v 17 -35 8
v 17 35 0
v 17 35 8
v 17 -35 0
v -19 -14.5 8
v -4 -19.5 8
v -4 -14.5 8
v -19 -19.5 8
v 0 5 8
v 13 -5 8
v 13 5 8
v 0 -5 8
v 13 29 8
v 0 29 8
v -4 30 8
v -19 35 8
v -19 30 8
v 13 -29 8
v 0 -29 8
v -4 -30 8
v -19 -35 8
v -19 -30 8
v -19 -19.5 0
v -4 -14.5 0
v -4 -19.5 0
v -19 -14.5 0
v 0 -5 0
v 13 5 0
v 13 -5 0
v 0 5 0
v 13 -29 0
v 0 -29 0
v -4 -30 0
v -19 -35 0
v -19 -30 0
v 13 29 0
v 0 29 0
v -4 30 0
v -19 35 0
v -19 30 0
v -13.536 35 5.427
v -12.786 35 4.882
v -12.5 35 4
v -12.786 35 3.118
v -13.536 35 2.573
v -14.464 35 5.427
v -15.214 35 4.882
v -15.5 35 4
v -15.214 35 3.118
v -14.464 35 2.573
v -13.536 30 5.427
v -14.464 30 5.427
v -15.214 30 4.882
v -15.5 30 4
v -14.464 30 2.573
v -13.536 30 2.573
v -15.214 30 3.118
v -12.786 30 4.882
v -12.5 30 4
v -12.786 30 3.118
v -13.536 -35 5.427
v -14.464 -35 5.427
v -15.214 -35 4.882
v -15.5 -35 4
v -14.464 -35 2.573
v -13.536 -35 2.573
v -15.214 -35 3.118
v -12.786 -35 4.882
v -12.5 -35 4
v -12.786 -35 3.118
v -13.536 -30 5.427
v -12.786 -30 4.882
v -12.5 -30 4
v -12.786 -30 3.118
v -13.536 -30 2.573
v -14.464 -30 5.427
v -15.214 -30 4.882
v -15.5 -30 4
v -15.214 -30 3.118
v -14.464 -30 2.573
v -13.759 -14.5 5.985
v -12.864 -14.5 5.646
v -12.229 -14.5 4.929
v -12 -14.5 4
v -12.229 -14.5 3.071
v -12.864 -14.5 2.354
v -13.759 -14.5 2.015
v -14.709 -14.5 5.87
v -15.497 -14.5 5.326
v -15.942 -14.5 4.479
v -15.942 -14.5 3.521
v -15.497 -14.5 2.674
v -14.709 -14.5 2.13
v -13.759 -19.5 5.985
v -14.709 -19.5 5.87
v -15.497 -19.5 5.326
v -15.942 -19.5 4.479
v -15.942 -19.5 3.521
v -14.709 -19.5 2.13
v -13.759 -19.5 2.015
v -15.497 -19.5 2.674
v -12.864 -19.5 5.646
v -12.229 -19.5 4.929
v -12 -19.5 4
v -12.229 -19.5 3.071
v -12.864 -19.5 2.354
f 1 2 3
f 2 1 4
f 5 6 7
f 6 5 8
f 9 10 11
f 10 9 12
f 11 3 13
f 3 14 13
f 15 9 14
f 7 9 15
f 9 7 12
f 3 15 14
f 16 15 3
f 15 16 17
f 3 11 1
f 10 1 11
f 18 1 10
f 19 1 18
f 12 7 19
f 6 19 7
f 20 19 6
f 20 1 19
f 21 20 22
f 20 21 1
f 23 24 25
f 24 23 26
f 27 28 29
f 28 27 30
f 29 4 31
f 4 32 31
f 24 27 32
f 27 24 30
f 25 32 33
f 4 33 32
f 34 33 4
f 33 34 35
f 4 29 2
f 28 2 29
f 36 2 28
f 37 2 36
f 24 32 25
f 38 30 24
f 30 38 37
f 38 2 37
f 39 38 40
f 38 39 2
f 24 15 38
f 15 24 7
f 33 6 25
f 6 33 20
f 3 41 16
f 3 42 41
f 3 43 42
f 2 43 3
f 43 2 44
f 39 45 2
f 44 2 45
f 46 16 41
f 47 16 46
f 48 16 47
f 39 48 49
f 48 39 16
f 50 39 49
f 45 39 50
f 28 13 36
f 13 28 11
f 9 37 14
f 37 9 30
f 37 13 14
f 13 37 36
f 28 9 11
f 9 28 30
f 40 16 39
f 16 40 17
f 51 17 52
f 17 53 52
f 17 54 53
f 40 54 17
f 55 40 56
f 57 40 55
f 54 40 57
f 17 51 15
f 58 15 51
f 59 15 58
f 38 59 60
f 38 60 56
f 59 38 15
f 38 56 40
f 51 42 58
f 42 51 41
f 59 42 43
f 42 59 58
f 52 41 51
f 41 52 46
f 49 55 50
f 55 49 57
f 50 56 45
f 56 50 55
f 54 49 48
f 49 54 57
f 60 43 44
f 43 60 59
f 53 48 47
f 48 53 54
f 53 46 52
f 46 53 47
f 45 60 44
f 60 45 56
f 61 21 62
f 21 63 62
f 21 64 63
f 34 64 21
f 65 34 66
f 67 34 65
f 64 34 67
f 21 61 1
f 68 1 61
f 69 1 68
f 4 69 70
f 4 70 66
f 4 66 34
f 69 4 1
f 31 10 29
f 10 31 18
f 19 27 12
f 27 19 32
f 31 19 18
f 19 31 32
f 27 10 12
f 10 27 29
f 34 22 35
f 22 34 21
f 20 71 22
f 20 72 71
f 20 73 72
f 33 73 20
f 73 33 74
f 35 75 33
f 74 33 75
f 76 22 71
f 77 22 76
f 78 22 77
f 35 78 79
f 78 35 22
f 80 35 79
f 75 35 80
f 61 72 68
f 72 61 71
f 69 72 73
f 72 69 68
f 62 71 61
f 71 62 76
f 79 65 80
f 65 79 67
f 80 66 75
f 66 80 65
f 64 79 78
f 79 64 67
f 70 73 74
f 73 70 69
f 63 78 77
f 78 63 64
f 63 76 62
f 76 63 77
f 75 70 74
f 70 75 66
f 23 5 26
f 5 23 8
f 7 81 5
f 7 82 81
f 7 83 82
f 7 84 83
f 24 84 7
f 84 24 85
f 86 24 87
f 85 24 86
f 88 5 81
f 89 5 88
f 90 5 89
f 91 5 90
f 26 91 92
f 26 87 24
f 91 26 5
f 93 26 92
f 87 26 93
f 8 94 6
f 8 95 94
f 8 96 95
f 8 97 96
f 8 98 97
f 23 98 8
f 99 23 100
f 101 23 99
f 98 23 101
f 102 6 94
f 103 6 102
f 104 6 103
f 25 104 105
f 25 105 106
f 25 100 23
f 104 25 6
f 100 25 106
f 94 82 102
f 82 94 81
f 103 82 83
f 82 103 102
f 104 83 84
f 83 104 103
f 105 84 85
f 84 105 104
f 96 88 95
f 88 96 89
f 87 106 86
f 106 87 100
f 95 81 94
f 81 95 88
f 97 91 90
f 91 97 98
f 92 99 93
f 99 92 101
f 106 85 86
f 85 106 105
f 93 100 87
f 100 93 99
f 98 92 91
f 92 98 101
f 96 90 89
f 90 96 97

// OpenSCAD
$fs=1;
$fa=1;

servo_l = 24;
servo_w = 13;
servo_h = 21;

bolt_hole_diameter = 3.0;
servo_axis_diameter = 4;

magnet_hole_l = 10.5;
magnet_hole_w = 6.5;
magnet_hole_d = 2;
magnet_hole_margin = 2;

base_l = servo_l * 2 + 24;
base_w = 44;
base_h = 3;

base_joint_space = 0.7;
base_joint_height = 26;

arm_h = 5;
arm_w = 5;
arm_l = 50;

pen_diameter = 13;

eraser_magnet_diameter = 25.5;

module servoholder(h = 8) {
	module bolt_bracket(d) {
		r=d/2;
		translate([-14,0,h/2])
		difference() {
			translate([4,0]) cube([18,5,h], center=true);
			rotate(a=90,v=[1,0,0]) cylinder(r=r, h=20, center=true);
		}
	}
	translate([0,0,-h/2]) {
		for (i = [0,1]) mirror([0,i,0]) {
			translate([0,5,0])
			difference() {
				translate([-4, -6]) cube([servo_w + 8, servo_l + 12, h]);
				translate([0,0,-1]) cube([servo_w, servo_l, h + 2]);
			}
			#translate([0,5/2 + servo_l + 6,0]) bolt_bracket(bolt_hole_diameter);
		}
		translate([0,-17,0]) bolt_bracket(servo_axis_diameter);
	}
}

module base() {
	difference() {
		translate([-base_w/2,-base_l/2]) cube([base_w,base_l,base_h]);
		for (i = [0,1]) mirror([i,0,0])
		for (j = [0,1]) mirror([0,j,0]) {
			translate([
				base_w/2 - magnet_hole_w - magnet_hole_margin,
				base_l/2 - magnet_hole_l - magnet_hole_margin,
				base_h - magnet_hole_d
			])
			cube([magnet_hole_w,magnet_hole_l,magnet_hole_d+1]);
		}
	}
	difference() {
		for (i = [0, 1]) mirror([0,i,0]) {
			translate([-servo_w/2 - 4, 0, 0]) cube([servo_w + 8, servo_l + 6 - base_joint_space, 15]);
			translate([0, servo_l + 6 - base_joint_space , 0])
			difference() {
				translate([-5, -5, 0]) cube([10, 5, base_joint_height + 4]);
				translate([0,1,base_joint_height]) rotate(a=90, v=[1,0,0]) cylinder(r=bolt_hole_diameter/2, h=10);
			}
		}
		translate([-servo_w/2,-servo_h/2,8]) {
			cube([servo_w,servo_h,servo_l]);
			translate([0,3.5,-4]) cube([12,3,6]);
		}
	}
}

module arm_ring(d) {
	do = d + arm_w;
	difference() {
		cylinder(h=arm_h, r=do/2);
		translate([0,0,-1]) cylinder(h=arm_h+2, r=d/2);
	}
}

module arm(hole1, hole2) {
	arm_ring(hole1);
	translate([hole1/2,-arm_w/2,0]) cube([arm_l-hole1/2-hole2/2,arm_w,arm_h]);
	translate([arm_l,0,0]) arm_ring(hole2);
}

module pen_arm() {
	arm(bolt_hole_diameter, bolt_hole_diameter);
	rotate(a=45,v=[0,0,1])
	translate([-arm_w/2-pen_diameter/2-bolt_hole_diameter/2,0])
	difference() {
		arm_ring(pen_diameter, pen_diameter + arm_w);
		translate([-pen_diameter/2,0,-1]) cylinder(r=pen_diameter/2,h=arm_h+2);
	}
}

module eraser() {
	module ring(di,do,h) {
		difference() {
			cylinder(h=h, r=do/2);
			translate([0,0,-1]) cylinder(h=h+2, r=di/2);
		}
	}
	ring(10, eraser_magnet_diameter + 1, 5);
	ring(eraser_magnet_diameter, eraser_magnet_diameter + 2.5, 8);
}

//color("yellow") translate([-50,0,0]) base();
color("red") translate([0,0,4]) servoholder();
//color("green") translate([40, 30, 0]) arm(servo_axis_diameter, bolt_hole_diameter);
//color("green") translate([40, 10, 0]) arm(servo_axis_diameter, bolt_hole_diameter);
//color("green") translate([40, -10, 0]) arm(bolt_hole_diameter, bolt_hole_diameter);
//color("green") translate([40, -30, 0]) pen_arm();
//color("blue") translate([60, 60, 0]) eraser();
